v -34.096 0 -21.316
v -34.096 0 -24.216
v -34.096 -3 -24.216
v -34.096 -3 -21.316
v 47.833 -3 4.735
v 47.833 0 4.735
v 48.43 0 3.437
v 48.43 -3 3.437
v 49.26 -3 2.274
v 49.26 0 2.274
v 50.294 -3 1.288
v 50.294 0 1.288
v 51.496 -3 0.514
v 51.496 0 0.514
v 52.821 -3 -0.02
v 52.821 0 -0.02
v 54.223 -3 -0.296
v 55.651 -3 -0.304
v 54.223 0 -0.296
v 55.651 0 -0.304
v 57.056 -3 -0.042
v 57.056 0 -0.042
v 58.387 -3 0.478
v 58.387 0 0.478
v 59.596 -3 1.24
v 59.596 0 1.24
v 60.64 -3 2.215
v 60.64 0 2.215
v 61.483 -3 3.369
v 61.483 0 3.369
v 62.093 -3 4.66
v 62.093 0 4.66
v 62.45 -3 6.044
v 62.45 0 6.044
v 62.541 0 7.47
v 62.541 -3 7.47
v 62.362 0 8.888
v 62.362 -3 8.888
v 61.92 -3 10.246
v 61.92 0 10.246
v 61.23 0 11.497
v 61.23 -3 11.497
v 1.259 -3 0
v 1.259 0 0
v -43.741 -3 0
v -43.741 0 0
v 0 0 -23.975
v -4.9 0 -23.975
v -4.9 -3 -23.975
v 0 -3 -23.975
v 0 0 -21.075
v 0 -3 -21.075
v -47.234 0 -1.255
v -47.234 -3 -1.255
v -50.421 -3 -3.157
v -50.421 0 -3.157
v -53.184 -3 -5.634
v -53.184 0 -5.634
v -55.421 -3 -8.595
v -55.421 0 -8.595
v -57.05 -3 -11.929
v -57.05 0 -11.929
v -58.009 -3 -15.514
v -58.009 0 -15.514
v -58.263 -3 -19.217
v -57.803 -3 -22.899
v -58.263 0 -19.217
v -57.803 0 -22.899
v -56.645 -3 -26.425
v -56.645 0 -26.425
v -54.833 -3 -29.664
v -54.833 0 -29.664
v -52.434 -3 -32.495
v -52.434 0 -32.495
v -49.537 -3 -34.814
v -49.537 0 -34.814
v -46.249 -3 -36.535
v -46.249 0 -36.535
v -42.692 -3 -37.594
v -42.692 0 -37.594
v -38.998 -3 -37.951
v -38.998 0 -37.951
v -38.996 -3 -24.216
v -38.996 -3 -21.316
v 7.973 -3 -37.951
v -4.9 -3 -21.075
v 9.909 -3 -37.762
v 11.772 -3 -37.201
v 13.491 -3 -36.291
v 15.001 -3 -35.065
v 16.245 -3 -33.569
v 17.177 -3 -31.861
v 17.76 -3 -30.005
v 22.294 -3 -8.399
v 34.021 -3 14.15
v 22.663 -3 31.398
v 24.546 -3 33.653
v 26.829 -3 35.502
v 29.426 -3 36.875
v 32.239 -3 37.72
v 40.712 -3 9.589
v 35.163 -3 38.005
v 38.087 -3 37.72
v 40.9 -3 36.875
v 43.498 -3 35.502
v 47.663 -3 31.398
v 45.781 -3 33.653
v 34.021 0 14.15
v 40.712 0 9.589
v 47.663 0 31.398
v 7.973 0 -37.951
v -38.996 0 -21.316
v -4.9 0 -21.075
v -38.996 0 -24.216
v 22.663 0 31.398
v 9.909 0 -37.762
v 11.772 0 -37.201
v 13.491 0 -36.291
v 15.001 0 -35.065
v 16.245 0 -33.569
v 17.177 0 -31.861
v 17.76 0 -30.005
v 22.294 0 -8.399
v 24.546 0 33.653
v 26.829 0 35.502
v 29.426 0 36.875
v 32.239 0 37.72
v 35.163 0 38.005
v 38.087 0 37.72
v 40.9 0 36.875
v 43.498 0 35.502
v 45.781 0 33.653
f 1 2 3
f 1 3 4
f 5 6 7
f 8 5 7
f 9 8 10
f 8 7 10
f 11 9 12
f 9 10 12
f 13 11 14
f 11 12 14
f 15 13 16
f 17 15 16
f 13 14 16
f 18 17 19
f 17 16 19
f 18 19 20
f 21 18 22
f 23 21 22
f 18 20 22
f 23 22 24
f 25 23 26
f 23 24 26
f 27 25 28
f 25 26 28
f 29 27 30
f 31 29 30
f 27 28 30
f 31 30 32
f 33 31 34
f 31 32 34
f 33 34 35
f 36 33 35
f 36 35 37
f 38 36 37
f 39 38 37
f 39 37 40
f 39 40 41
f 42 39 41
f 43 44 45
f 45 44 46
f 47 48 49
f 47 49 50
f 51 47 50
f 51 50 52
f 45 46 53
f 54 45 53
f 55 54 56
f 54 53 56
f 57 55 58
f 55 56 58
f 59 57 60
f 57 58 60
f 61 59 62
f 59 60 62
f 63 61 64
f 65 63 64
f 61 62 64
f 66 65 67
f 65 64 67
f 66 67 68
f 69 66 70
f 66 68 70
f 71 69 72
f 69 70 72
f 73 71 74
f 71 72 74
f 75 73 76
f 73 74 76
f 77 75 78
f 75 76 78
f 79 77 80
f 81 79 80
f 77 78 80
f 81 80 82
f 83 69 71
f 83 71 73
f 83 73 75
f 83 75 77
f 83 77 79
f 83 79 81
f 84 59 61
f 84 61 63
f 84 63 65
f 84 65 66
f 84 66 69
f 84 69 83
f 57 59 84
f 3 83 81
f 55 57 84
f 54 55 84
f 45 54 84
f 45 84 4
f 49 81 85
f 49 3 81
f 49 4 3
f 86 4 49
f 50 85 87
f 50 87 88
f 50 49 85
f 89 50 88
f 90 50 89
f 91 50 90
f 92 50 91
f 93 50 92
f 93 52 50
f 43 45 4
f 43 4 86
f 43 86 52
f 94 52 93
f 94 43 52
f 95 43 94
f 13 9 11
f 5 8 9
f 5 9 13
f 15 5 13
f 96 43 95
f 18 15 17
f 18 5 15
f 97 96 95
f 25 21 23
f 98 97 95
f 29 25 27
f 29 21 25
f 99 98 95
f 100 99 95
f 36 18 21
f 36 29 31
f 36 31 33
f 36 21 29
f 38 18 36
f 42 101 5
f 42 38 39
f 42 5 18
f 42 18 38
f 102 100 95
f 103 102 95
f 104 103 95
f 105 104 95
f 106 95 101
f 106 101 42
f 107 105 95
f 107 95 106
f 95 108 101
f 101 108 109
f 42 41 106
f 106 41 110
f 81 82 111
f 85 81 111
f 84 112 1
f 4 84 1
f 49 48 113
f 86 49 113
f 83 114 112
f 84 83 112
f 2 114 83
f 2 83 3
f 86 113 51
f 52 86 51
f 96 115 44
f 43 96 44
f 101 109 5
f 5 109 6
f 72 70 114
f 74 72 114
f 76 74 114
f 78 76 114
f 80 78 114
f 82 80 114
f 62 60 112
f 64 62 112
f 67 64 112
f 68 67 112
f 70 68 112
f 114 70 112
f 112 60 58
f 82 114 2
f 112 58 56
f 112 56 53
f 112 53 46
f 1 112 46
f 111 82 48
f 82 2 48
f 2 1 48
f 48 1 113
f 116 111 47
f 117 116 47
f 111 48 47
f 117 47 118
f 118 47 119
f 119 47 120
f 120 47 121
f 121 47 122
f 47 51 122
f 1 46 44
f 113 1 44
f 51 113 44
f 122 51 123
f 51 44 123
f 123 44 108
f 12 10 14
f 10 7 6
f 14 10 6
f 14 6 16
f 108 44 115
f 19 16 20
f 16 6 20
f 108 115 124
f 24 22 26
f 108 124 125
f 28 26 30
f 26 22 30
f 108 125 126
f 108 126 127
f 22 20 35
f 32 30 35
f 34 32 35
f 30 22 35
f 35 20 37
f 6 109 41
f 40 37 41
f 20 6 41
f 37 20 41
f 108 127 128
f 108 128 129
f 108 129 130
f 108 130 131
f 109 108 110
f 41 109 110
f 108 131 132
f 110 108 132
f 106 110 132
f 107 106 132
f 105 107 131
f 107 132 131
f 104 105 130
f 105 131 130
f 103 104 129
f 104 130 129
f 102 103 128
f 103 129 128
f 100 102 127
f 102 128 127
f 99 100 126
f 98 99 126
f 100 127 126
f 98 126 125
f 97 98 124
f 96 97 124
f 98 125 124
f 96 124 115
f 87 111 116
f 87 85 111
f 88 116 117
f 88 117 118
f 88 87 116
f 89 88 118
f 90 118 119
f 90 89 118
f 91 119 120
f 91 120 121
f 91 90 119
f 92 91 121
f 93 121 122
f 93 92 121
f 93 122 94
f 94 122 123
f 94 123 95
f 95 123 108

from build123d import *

# Parameters (mm, degrees)
F1_DEPTH = 3
F2_R     = 10
F3_W     = 4.9
F3_H     = 2.9
F4_DEPTH = 25
F5_DEPTH = 25


with BuildPart() as f1:
    # F0 (on Front) → F1 (new body)
    with BuildSketch(Plane.XZ):
        with BuildLine():
            ThreePointArc((-43.741338, 0), (-58.121657, -21.069105), (-38.998462, -37.951171))
            Line((-38.998462, -37.951171), (16.091859, -37.951171))
            Line((16.091859, -37.951171), (22.294076, -8.399412))
            Line((22.294076, -8.399412), (34.020763, 14.150426))
            Line((34.020763, 14.150426), (40.711638, 9.589177))
            Line((40.711638, 9.589177), (47.832642, 4.734704))
            ThreePointArc((47.832642, 4.734704), (58.386807, 0.478115), (61.229721, 11.497498))
            Line((61.229721, 11.497498), (47.663182, 31.398193))
            ThreePointArc((47.663182, 31.398193), (35.163182, 38.005054), (22.663182, 31.398193))
            Line((22.663182, 31.398193), (1.258662, 0))
            Line((1.258662, 0), (-43.741338, 0))
        make_face()
    extrude(amount=F1_DEPTH)

    # F2
    f2_edges = [f1.edges().sort_by_distance(p)[0] for p in [
        (16.091859, -1.5, -37.951171),
    ]]
    fillet(f2_edges, radius=F2_R)

    # F3 (on Front) → F4 (cut)
    with BuildSketch(Plane.XZ):
        with Locations((-36.54559, -22.766416)):
            Rectangle(F3_W, F3_H)
        with Locations((-2.45, -22.52518)):
            Rectangle(F3_W, F3_H)
    extrude(amount=-F4_DEPTH, mode=Mode.SUBTRACT)

    # F3 (on Front) → F5 (cut)
    with BuildSketch(Plane.XZ):
        with Locations((-36.54559, -22.766416)):
            Rectangle(F3_W, F3_H)
        with Locations((-2.45, -22.52518)):
            Rectangle(F3_W, F3_H)
    extrude(amount=F5_DEPTH, mode=Mode.SUBTRACT)


solid = f1.part
